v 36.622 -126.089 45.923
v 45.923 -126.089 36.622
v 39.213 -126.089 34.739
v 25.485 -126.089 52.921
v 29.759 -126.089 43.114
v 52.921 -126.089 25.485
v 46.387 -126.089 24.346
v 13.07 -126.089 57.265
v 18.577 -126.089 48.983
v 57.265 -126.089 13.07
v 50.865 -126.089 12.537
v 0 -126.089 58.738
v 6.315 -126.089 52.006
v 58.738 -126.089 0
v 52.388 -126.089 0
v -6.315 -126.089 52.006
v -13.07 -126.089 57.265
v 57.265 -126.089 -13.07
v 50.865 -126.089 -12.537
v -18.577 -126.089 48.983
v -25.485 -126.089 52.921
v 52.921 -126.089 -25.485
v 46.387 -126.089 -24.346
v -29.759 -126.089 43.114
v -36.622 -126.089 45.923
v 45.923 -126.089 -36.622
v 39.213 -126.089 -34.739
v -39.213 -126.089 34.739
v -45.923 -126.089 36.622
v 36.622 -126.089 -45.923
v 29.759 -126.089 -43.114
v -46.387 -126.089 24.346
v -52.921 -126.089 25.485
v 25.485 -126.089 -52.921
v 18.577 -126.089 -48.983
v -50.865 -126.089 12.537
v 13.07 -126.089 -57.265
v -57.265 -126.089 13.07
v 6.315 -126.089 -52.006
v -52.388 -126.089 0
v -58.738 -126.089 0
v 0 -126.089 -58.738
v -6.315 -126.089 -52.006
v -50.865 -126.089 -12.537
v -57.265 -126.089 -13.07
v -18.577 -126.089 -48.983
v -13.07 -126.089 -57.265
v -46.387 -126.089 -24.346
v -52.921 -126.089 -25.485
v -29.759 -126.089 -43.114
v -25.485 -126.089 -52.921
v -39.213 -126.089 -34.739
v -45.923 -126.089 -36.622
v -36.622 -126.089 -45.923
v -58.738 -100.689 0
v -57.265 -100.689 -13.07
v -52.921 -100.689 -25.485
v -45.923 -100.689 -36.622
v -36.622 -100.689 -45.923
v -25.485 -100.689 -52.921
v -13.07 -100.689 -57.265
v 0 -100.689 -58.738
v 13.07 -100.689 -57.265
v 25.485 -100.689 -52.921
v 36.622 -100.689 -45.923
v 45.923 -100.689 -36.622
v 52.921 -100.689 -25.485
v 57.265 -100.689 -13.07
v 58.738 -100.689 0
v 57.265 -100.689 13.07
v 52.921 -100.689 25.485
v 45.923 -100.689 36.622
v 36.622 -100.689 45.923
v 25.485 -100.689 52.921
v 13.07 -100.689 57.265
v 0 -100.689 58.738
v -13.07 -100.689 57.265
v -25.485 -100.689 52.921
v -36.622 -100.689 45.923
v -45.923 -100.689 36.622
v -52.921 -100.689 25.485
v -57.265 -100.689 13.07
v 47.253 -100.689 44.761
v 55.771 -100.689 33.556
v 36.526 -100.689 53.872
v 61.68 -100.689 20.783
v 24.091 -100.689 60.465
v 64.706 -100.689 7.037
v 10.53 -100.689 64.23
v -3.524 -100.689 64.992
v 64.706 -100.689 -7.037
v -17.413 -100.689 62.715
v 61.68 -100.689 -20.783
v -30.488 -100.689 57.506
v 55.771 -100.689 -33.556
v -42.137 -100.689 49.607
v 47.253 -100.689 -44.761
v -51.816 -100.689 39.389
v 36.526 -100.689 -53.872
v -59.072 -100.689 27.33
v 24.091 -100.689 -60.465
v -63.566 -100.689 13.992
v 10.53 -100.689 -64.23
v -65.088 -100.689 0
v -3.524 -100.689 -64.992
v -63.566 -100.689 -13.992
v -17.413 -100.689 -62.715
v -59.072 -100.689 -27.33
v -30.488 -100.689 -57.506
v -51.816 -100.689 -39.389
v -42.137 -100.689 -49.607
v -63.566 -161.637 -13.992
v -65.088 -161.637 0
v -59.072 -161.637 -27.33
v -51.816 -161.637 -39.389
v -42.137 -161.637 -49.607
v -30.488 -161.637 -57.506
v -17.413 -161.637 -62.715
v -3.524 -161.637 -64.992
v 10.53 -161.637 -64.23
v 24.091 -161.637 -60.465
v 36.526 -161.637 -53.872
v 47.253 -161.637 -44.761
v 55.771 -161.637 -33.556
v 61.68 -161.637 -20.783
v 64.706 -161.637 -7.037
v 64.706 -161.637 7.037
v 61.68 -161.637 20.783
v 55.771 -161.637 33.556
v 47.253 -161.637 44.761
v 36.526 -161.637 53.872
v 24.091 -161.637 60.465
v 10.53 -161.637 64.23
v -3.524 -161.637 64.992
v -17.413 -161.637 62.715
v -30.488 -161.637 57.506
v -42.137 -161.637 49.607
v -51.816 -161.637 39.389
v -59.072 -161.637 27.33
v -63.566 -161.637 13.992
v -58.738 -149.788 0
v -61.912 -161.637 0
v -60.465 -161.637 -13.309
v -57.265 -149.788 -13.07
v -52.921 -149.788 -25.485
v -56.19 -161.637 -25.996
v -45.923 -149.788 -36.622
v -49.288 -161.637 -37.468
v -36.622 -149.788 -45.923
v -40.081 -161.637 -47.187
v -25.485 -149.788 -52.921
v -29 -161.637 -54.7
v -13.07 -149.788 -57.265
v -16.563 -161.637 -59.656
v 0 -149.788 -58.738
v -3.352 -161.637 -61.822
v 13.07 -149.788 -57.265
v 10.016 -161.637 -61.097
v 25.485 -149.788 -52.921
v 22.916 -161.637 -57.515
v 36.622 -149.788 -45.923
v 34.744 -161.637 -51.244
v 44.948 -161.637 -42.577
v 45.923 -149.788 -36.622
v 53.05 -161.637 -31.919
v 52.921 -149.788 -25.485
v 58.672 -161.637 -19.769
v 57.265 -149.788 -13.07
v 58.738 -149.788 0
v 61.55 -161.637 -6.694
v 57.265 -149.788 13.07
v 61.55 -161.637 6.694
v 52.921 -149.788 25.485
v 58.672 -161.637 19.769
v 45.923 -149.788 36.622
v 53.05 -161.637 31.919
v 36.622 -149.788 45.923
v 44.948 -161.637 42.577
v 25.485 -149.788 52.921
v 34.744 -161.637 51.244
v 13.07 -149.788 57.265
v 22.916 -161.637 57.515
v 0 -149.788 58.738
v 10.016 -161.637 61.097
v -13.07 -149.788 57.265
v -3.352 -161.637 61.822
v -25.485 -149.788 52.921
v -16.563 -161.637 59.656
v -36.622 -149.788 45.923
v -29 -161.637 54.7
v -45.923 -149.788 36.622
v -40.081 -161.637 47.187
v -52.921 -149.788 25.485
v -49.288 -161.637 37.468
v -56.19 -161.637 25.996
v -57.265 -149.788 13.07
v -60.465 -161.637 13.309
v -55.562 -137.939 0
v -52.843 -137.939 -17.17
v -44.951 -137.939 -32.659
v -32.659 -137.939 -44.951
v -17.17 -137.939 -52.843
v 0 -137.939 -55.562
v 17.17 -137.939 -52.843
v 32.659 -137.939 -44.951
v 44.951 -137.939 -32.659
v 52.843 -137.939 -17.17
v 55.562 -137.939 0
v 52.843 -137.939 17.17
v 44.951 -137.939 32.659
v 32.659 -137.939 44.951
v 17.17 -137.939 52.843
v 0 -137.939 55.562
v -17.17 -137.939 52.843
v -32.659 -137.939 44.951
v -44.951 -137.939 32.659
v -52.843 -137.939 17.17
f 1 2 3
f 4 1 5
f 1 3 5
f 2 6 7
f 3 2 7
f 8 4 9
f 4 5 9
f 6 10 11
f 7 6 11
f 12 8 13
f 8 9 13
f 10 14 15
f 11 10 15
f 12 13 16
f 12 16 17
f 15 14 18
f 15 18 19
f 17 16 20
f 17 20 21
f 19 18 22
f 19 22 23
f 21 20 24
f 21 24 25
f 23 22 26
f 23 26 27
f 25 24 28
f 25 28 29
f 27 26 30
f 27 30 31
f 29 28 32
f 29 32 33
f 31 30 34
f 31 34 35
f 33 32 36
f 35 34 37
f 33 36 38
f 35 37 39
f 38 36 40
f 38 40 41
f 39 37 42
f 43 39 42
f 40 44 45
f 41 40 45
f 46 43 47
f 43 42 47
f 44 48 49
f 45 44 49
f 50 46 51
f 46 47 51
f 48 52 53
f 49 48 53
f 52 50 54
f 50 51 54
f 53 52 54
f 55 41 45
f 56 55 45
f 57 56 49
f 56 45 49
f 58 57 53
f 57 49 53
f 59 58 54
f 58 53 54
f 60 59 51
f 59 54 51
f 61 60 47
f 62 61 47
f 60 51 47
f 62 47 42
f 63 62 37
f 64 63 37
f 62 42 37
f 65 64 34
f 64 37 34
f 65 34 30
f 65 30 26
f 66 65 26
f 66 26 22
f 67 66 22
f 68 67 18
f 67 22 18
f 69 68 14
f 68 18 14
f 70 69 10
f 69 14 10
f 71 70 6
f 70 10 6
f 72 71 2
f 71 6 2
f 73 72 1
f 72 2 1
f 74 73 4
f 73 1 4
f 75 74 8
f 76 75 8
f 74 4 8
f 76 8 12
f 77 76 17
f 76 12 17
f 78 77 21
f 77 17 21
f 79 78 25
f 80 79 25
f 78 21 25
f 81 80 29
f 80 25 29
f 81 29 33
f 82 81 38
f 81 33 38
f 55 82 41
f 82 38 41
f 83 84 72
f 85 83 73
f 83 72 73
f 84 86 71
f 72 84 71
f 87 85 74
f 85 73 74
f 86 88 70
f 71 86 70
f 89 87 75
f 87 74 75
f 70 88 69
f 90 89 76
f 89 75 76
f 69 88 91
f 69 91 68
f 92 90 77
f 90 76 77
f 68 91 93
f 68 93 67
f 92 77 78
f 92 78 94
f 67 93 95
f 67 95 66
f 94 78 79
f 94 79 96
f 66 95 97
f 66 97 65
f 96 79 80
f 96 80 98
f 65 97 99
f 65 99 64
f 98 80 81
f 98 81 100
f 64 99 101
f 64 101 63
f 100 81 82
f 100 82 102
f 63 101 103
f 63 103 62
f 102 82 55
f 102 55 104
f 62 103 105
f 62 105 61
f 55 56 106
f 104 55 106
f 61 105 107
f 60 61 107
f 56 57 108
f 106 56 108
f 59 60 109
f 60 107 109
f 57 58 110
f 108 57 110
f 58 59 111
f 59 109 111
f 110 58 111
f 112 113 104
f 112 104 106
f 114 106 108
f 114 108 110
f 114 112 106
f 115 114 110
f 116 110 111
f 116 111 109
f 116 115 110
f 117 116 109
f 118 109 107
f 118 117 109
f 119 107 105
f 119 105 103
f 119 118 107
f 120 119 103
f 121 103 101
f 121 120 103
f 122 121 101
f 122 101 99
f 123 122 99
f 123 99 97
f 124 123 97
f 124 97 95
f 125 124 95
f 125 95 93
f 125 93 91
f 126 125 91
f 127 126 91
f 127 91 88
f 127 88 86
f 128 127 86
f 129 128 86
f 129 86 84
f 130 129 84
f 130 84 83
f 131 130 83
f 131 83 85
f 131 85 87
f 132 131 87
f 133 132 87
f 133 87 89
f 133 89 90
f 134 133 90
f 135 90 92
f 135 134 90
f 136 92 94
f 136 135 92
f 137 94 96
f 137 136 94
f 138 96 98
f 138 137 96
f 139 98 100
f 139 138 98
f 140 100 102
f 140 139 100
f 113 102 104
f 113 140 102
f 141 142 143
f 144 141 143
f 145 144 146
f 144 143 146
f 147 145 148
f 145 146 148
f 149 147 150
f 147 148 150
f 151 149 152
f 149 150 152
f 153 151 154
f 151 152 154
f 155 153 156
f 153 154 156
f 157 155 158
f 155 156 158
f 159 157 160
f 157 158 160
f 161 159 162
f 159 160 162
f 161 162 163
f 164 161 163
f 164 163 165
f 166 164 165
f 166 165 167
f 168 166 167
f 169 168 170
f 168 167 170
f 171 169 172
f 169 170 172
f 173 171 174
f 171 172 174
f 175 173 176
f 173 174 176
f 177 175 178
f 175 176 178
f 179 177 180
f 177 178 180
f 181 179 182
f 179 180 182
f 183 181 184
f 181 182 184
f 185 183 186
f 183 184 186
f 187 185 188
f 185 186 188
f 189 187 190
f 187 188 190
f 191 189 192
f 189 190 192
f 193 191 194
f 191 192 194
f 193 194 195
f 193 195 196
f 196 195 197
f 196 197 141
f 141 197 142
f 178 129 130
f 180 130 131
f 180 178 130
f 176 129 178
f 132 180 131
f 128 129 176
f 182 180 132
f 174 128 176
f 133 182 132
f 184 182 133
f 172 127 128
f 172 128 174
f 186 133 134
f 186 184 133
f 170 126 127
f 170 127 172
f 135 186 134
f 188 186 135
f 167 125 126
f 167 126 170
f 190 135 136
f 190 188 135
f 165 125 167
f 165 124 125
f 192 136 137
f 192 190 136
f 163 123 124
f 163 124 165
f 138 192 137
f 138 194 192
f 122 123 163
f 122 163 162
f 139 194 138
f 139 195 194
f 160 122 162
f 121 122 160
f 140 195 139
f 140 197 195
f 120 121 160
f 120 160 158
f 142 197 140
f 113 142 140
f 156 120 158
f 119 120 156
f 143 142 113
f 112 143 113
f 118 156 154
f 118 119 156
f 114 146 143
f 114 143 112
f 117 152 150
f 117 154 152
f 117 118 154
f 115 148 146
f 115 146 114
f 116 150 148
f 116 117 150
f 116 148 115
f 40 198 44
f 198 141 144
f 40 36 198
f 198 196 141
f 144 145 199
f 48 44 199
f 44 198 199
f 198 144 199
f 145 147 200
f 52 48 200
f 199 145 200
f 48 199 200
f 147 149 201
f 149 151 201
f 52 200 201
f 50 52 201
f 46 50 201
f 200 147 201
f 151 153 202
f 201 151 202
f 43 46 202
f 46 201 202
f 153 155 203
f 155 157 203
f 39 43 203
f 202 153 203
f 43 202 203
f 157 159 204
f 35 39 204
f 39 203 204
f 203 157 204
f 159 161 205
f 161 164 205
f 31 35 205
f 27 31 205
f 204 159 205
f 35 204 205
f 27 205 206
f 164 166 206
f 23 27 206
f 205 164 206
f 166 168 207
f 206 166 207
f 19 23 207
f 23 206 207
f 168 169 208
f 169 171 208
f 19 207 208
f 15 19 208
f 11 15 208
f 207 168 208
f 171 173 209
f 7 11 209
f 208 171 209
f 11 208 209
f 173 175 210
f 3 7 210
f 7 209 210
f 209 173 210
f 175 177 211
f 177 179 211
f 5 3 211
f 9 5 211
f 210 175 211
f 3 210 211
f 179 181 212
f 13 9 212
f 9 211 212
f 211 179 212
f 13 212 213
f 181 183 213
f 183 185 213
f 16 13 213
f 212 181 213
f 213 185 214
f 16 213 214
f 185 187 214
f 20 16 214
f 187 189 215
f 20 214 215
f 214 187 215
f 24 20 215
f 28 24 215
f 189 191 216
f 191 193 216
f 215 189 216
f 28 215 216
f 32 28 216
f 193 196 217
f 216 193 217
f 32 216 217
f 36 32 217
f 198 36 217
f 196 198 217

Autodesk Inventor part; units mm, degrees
ref_plane "YZ Plane" through (0, 0, 0) normal (1, 0, 0) x (0, 1, 0)
ref_plane "XZ Plane" through (0, 0, 0) normal (0, 1, 0) x (-1, 0, 0)
ref_plane "XY Plane" through (0, 0, 0) normal (0, 0, 1) x (1, 0, 0)
sketch "Sketch1" plane through (0, 0, 0) normal (0, 0, 1) x (1, 0, 0)
  arc A0 (-19.4827, -3.287) -> (-19.05, 0) centre (-31.75, 0) ccw
  line L0 (-19.4827, -3.287) -> (-58.7375, -149.7878)
  line L1 (-65.8876, 46.8376) -> (-65.8876, 21.4376)
  line L2 (-65.8876, 21.4376) -> (-71.4375, 21.4376)
  arc A1 (-19.05, 0) -> (-65.8876, 46.8376) centre (-65.8876, 0) ccw
  line L3 (-44.45, 34.1376) -> (-33.8192, 34.1376)
  line L4 (-44.45, 34.1376) -> (-37.3992, -46.4536)
  line L5 (-44.45, 34.1376) -> (0, 34.1376) construction
  line L6 (-37.3992, -46.4536) -> (-31.0492, -46.4536)
  line L7 (-71.4375, 21.4376) -> (-71.4375, 8.7376)
  line L8 (-71.4375, 8.7376) -> (-58.7375, 8.7376)
  line L9 (-58.7375, 8.7376) -> (-52.3875, 8.7376)
  line L10 (-52.3875, 8.7376) -> (-52.3875, -102.3907)
  line L11 (-71.4375, 8.7376) -> (-71.4375, -0.7874)
  line L12 (-71.4375, 8.7376) -> (-61.9125, 8.7376) construction
  line L13 (-71.4375, -0.7874) -> (-58.7375, -0.7874)
  line L14 (-58.7375, -0.7874) -> (-58.7375, -51.5874)
  line L15 (-58.7375, -51.5874) -> (-71.4375, -51.5874)
  line L16 (-71.4375, -0.7874) -> (-65.0875, -0.7874)
  line L17 (-65.0875, -0.7874) -> (-65.0875, -6.731)
  line L18 (-65.0875, -6.731) -> (-71.4375, -6.731)
  line L19 (-71.4375, 21.4376) -> (-71.4375, -0.7874)
  line L20 (-71.4375, -6.731) -> (-71.4375, -51.5874)
  line L21 (-58.7375, -51.5874) -> (-58.7375, -126.0892)
  line L22 (-58.7375, -51.5874) -> (0, -51.5874) construction
  line L23 (-46.0375, -102.3907) -> (-52.3875, -102.3907)
  line L24 (-65.0875, -51.5907) -> (-58.7375, -51.5907)
  line L25 (-58.7375, -149.7878) -> (-61.9125, -161.637)
  line L26 (-58.7375, -149.7878) -> (-34.203, -149.7878) construction
  line L27 (-65.0875, -161.637) -> (-61.9125, -161.637)
  line L28 (-58.7375, -126.0892) -> (-52.3875, -126.0892)
  line L29 (0, 34.1376) -> (0, 0)
  line L30 (-65.0875, -100.6892) -> (-65.0875, -161.637)
  line L31 (-58.7375, -51.5907) -> (-61.9125, -51.5907)
  line L32 (-65.0875, -100.6892) -> (-58.7375, -100.6892)
  dimension "d0" = 19.05
  dimension "d1" = 25.4
  dimension "d2" = 5.5499
  dimension "d3" = 65.8876
  dimension "d4" = 85
  dimension "d5" = 12.7
  dimension "d6" = 46.8376
  dimension "d7" = 12.7
  dimension "d8" = 44.45
  dimension "d9" = 6.35
  dimension "d10" = 105
  dimension "d11" = 12.7
  dimension "d12" = 12.7
  dimension "d13" = 6.35
  dimension "d14" = 9.525
  dimension "d15" = 50.8
  dimension "d16" = 12.7
  dimension "d17" = 6.35
  dimension "d18" = 5.9436
  dimension "d19" = 6.35
  dimension "d20" = 50.8
  dimension "d21" = 6.35
  dimension "d22" = 105
  dimension "d23" = 3.175
  dimension "d24" = 6.35
  dimension "d25" = 60.9478
  dimension "d26" = 3.175
  dimension "d27" = 6.35
revolve "Revolution1" add sketch "Sketch1" angle 360 about axis through (0, 34.1376, 0) along (0, -1, 0) contours L0 L25 L27 L30 L32 L21 L28
properties part number "Aluminum Skirt" material "Aluminum 6061"
